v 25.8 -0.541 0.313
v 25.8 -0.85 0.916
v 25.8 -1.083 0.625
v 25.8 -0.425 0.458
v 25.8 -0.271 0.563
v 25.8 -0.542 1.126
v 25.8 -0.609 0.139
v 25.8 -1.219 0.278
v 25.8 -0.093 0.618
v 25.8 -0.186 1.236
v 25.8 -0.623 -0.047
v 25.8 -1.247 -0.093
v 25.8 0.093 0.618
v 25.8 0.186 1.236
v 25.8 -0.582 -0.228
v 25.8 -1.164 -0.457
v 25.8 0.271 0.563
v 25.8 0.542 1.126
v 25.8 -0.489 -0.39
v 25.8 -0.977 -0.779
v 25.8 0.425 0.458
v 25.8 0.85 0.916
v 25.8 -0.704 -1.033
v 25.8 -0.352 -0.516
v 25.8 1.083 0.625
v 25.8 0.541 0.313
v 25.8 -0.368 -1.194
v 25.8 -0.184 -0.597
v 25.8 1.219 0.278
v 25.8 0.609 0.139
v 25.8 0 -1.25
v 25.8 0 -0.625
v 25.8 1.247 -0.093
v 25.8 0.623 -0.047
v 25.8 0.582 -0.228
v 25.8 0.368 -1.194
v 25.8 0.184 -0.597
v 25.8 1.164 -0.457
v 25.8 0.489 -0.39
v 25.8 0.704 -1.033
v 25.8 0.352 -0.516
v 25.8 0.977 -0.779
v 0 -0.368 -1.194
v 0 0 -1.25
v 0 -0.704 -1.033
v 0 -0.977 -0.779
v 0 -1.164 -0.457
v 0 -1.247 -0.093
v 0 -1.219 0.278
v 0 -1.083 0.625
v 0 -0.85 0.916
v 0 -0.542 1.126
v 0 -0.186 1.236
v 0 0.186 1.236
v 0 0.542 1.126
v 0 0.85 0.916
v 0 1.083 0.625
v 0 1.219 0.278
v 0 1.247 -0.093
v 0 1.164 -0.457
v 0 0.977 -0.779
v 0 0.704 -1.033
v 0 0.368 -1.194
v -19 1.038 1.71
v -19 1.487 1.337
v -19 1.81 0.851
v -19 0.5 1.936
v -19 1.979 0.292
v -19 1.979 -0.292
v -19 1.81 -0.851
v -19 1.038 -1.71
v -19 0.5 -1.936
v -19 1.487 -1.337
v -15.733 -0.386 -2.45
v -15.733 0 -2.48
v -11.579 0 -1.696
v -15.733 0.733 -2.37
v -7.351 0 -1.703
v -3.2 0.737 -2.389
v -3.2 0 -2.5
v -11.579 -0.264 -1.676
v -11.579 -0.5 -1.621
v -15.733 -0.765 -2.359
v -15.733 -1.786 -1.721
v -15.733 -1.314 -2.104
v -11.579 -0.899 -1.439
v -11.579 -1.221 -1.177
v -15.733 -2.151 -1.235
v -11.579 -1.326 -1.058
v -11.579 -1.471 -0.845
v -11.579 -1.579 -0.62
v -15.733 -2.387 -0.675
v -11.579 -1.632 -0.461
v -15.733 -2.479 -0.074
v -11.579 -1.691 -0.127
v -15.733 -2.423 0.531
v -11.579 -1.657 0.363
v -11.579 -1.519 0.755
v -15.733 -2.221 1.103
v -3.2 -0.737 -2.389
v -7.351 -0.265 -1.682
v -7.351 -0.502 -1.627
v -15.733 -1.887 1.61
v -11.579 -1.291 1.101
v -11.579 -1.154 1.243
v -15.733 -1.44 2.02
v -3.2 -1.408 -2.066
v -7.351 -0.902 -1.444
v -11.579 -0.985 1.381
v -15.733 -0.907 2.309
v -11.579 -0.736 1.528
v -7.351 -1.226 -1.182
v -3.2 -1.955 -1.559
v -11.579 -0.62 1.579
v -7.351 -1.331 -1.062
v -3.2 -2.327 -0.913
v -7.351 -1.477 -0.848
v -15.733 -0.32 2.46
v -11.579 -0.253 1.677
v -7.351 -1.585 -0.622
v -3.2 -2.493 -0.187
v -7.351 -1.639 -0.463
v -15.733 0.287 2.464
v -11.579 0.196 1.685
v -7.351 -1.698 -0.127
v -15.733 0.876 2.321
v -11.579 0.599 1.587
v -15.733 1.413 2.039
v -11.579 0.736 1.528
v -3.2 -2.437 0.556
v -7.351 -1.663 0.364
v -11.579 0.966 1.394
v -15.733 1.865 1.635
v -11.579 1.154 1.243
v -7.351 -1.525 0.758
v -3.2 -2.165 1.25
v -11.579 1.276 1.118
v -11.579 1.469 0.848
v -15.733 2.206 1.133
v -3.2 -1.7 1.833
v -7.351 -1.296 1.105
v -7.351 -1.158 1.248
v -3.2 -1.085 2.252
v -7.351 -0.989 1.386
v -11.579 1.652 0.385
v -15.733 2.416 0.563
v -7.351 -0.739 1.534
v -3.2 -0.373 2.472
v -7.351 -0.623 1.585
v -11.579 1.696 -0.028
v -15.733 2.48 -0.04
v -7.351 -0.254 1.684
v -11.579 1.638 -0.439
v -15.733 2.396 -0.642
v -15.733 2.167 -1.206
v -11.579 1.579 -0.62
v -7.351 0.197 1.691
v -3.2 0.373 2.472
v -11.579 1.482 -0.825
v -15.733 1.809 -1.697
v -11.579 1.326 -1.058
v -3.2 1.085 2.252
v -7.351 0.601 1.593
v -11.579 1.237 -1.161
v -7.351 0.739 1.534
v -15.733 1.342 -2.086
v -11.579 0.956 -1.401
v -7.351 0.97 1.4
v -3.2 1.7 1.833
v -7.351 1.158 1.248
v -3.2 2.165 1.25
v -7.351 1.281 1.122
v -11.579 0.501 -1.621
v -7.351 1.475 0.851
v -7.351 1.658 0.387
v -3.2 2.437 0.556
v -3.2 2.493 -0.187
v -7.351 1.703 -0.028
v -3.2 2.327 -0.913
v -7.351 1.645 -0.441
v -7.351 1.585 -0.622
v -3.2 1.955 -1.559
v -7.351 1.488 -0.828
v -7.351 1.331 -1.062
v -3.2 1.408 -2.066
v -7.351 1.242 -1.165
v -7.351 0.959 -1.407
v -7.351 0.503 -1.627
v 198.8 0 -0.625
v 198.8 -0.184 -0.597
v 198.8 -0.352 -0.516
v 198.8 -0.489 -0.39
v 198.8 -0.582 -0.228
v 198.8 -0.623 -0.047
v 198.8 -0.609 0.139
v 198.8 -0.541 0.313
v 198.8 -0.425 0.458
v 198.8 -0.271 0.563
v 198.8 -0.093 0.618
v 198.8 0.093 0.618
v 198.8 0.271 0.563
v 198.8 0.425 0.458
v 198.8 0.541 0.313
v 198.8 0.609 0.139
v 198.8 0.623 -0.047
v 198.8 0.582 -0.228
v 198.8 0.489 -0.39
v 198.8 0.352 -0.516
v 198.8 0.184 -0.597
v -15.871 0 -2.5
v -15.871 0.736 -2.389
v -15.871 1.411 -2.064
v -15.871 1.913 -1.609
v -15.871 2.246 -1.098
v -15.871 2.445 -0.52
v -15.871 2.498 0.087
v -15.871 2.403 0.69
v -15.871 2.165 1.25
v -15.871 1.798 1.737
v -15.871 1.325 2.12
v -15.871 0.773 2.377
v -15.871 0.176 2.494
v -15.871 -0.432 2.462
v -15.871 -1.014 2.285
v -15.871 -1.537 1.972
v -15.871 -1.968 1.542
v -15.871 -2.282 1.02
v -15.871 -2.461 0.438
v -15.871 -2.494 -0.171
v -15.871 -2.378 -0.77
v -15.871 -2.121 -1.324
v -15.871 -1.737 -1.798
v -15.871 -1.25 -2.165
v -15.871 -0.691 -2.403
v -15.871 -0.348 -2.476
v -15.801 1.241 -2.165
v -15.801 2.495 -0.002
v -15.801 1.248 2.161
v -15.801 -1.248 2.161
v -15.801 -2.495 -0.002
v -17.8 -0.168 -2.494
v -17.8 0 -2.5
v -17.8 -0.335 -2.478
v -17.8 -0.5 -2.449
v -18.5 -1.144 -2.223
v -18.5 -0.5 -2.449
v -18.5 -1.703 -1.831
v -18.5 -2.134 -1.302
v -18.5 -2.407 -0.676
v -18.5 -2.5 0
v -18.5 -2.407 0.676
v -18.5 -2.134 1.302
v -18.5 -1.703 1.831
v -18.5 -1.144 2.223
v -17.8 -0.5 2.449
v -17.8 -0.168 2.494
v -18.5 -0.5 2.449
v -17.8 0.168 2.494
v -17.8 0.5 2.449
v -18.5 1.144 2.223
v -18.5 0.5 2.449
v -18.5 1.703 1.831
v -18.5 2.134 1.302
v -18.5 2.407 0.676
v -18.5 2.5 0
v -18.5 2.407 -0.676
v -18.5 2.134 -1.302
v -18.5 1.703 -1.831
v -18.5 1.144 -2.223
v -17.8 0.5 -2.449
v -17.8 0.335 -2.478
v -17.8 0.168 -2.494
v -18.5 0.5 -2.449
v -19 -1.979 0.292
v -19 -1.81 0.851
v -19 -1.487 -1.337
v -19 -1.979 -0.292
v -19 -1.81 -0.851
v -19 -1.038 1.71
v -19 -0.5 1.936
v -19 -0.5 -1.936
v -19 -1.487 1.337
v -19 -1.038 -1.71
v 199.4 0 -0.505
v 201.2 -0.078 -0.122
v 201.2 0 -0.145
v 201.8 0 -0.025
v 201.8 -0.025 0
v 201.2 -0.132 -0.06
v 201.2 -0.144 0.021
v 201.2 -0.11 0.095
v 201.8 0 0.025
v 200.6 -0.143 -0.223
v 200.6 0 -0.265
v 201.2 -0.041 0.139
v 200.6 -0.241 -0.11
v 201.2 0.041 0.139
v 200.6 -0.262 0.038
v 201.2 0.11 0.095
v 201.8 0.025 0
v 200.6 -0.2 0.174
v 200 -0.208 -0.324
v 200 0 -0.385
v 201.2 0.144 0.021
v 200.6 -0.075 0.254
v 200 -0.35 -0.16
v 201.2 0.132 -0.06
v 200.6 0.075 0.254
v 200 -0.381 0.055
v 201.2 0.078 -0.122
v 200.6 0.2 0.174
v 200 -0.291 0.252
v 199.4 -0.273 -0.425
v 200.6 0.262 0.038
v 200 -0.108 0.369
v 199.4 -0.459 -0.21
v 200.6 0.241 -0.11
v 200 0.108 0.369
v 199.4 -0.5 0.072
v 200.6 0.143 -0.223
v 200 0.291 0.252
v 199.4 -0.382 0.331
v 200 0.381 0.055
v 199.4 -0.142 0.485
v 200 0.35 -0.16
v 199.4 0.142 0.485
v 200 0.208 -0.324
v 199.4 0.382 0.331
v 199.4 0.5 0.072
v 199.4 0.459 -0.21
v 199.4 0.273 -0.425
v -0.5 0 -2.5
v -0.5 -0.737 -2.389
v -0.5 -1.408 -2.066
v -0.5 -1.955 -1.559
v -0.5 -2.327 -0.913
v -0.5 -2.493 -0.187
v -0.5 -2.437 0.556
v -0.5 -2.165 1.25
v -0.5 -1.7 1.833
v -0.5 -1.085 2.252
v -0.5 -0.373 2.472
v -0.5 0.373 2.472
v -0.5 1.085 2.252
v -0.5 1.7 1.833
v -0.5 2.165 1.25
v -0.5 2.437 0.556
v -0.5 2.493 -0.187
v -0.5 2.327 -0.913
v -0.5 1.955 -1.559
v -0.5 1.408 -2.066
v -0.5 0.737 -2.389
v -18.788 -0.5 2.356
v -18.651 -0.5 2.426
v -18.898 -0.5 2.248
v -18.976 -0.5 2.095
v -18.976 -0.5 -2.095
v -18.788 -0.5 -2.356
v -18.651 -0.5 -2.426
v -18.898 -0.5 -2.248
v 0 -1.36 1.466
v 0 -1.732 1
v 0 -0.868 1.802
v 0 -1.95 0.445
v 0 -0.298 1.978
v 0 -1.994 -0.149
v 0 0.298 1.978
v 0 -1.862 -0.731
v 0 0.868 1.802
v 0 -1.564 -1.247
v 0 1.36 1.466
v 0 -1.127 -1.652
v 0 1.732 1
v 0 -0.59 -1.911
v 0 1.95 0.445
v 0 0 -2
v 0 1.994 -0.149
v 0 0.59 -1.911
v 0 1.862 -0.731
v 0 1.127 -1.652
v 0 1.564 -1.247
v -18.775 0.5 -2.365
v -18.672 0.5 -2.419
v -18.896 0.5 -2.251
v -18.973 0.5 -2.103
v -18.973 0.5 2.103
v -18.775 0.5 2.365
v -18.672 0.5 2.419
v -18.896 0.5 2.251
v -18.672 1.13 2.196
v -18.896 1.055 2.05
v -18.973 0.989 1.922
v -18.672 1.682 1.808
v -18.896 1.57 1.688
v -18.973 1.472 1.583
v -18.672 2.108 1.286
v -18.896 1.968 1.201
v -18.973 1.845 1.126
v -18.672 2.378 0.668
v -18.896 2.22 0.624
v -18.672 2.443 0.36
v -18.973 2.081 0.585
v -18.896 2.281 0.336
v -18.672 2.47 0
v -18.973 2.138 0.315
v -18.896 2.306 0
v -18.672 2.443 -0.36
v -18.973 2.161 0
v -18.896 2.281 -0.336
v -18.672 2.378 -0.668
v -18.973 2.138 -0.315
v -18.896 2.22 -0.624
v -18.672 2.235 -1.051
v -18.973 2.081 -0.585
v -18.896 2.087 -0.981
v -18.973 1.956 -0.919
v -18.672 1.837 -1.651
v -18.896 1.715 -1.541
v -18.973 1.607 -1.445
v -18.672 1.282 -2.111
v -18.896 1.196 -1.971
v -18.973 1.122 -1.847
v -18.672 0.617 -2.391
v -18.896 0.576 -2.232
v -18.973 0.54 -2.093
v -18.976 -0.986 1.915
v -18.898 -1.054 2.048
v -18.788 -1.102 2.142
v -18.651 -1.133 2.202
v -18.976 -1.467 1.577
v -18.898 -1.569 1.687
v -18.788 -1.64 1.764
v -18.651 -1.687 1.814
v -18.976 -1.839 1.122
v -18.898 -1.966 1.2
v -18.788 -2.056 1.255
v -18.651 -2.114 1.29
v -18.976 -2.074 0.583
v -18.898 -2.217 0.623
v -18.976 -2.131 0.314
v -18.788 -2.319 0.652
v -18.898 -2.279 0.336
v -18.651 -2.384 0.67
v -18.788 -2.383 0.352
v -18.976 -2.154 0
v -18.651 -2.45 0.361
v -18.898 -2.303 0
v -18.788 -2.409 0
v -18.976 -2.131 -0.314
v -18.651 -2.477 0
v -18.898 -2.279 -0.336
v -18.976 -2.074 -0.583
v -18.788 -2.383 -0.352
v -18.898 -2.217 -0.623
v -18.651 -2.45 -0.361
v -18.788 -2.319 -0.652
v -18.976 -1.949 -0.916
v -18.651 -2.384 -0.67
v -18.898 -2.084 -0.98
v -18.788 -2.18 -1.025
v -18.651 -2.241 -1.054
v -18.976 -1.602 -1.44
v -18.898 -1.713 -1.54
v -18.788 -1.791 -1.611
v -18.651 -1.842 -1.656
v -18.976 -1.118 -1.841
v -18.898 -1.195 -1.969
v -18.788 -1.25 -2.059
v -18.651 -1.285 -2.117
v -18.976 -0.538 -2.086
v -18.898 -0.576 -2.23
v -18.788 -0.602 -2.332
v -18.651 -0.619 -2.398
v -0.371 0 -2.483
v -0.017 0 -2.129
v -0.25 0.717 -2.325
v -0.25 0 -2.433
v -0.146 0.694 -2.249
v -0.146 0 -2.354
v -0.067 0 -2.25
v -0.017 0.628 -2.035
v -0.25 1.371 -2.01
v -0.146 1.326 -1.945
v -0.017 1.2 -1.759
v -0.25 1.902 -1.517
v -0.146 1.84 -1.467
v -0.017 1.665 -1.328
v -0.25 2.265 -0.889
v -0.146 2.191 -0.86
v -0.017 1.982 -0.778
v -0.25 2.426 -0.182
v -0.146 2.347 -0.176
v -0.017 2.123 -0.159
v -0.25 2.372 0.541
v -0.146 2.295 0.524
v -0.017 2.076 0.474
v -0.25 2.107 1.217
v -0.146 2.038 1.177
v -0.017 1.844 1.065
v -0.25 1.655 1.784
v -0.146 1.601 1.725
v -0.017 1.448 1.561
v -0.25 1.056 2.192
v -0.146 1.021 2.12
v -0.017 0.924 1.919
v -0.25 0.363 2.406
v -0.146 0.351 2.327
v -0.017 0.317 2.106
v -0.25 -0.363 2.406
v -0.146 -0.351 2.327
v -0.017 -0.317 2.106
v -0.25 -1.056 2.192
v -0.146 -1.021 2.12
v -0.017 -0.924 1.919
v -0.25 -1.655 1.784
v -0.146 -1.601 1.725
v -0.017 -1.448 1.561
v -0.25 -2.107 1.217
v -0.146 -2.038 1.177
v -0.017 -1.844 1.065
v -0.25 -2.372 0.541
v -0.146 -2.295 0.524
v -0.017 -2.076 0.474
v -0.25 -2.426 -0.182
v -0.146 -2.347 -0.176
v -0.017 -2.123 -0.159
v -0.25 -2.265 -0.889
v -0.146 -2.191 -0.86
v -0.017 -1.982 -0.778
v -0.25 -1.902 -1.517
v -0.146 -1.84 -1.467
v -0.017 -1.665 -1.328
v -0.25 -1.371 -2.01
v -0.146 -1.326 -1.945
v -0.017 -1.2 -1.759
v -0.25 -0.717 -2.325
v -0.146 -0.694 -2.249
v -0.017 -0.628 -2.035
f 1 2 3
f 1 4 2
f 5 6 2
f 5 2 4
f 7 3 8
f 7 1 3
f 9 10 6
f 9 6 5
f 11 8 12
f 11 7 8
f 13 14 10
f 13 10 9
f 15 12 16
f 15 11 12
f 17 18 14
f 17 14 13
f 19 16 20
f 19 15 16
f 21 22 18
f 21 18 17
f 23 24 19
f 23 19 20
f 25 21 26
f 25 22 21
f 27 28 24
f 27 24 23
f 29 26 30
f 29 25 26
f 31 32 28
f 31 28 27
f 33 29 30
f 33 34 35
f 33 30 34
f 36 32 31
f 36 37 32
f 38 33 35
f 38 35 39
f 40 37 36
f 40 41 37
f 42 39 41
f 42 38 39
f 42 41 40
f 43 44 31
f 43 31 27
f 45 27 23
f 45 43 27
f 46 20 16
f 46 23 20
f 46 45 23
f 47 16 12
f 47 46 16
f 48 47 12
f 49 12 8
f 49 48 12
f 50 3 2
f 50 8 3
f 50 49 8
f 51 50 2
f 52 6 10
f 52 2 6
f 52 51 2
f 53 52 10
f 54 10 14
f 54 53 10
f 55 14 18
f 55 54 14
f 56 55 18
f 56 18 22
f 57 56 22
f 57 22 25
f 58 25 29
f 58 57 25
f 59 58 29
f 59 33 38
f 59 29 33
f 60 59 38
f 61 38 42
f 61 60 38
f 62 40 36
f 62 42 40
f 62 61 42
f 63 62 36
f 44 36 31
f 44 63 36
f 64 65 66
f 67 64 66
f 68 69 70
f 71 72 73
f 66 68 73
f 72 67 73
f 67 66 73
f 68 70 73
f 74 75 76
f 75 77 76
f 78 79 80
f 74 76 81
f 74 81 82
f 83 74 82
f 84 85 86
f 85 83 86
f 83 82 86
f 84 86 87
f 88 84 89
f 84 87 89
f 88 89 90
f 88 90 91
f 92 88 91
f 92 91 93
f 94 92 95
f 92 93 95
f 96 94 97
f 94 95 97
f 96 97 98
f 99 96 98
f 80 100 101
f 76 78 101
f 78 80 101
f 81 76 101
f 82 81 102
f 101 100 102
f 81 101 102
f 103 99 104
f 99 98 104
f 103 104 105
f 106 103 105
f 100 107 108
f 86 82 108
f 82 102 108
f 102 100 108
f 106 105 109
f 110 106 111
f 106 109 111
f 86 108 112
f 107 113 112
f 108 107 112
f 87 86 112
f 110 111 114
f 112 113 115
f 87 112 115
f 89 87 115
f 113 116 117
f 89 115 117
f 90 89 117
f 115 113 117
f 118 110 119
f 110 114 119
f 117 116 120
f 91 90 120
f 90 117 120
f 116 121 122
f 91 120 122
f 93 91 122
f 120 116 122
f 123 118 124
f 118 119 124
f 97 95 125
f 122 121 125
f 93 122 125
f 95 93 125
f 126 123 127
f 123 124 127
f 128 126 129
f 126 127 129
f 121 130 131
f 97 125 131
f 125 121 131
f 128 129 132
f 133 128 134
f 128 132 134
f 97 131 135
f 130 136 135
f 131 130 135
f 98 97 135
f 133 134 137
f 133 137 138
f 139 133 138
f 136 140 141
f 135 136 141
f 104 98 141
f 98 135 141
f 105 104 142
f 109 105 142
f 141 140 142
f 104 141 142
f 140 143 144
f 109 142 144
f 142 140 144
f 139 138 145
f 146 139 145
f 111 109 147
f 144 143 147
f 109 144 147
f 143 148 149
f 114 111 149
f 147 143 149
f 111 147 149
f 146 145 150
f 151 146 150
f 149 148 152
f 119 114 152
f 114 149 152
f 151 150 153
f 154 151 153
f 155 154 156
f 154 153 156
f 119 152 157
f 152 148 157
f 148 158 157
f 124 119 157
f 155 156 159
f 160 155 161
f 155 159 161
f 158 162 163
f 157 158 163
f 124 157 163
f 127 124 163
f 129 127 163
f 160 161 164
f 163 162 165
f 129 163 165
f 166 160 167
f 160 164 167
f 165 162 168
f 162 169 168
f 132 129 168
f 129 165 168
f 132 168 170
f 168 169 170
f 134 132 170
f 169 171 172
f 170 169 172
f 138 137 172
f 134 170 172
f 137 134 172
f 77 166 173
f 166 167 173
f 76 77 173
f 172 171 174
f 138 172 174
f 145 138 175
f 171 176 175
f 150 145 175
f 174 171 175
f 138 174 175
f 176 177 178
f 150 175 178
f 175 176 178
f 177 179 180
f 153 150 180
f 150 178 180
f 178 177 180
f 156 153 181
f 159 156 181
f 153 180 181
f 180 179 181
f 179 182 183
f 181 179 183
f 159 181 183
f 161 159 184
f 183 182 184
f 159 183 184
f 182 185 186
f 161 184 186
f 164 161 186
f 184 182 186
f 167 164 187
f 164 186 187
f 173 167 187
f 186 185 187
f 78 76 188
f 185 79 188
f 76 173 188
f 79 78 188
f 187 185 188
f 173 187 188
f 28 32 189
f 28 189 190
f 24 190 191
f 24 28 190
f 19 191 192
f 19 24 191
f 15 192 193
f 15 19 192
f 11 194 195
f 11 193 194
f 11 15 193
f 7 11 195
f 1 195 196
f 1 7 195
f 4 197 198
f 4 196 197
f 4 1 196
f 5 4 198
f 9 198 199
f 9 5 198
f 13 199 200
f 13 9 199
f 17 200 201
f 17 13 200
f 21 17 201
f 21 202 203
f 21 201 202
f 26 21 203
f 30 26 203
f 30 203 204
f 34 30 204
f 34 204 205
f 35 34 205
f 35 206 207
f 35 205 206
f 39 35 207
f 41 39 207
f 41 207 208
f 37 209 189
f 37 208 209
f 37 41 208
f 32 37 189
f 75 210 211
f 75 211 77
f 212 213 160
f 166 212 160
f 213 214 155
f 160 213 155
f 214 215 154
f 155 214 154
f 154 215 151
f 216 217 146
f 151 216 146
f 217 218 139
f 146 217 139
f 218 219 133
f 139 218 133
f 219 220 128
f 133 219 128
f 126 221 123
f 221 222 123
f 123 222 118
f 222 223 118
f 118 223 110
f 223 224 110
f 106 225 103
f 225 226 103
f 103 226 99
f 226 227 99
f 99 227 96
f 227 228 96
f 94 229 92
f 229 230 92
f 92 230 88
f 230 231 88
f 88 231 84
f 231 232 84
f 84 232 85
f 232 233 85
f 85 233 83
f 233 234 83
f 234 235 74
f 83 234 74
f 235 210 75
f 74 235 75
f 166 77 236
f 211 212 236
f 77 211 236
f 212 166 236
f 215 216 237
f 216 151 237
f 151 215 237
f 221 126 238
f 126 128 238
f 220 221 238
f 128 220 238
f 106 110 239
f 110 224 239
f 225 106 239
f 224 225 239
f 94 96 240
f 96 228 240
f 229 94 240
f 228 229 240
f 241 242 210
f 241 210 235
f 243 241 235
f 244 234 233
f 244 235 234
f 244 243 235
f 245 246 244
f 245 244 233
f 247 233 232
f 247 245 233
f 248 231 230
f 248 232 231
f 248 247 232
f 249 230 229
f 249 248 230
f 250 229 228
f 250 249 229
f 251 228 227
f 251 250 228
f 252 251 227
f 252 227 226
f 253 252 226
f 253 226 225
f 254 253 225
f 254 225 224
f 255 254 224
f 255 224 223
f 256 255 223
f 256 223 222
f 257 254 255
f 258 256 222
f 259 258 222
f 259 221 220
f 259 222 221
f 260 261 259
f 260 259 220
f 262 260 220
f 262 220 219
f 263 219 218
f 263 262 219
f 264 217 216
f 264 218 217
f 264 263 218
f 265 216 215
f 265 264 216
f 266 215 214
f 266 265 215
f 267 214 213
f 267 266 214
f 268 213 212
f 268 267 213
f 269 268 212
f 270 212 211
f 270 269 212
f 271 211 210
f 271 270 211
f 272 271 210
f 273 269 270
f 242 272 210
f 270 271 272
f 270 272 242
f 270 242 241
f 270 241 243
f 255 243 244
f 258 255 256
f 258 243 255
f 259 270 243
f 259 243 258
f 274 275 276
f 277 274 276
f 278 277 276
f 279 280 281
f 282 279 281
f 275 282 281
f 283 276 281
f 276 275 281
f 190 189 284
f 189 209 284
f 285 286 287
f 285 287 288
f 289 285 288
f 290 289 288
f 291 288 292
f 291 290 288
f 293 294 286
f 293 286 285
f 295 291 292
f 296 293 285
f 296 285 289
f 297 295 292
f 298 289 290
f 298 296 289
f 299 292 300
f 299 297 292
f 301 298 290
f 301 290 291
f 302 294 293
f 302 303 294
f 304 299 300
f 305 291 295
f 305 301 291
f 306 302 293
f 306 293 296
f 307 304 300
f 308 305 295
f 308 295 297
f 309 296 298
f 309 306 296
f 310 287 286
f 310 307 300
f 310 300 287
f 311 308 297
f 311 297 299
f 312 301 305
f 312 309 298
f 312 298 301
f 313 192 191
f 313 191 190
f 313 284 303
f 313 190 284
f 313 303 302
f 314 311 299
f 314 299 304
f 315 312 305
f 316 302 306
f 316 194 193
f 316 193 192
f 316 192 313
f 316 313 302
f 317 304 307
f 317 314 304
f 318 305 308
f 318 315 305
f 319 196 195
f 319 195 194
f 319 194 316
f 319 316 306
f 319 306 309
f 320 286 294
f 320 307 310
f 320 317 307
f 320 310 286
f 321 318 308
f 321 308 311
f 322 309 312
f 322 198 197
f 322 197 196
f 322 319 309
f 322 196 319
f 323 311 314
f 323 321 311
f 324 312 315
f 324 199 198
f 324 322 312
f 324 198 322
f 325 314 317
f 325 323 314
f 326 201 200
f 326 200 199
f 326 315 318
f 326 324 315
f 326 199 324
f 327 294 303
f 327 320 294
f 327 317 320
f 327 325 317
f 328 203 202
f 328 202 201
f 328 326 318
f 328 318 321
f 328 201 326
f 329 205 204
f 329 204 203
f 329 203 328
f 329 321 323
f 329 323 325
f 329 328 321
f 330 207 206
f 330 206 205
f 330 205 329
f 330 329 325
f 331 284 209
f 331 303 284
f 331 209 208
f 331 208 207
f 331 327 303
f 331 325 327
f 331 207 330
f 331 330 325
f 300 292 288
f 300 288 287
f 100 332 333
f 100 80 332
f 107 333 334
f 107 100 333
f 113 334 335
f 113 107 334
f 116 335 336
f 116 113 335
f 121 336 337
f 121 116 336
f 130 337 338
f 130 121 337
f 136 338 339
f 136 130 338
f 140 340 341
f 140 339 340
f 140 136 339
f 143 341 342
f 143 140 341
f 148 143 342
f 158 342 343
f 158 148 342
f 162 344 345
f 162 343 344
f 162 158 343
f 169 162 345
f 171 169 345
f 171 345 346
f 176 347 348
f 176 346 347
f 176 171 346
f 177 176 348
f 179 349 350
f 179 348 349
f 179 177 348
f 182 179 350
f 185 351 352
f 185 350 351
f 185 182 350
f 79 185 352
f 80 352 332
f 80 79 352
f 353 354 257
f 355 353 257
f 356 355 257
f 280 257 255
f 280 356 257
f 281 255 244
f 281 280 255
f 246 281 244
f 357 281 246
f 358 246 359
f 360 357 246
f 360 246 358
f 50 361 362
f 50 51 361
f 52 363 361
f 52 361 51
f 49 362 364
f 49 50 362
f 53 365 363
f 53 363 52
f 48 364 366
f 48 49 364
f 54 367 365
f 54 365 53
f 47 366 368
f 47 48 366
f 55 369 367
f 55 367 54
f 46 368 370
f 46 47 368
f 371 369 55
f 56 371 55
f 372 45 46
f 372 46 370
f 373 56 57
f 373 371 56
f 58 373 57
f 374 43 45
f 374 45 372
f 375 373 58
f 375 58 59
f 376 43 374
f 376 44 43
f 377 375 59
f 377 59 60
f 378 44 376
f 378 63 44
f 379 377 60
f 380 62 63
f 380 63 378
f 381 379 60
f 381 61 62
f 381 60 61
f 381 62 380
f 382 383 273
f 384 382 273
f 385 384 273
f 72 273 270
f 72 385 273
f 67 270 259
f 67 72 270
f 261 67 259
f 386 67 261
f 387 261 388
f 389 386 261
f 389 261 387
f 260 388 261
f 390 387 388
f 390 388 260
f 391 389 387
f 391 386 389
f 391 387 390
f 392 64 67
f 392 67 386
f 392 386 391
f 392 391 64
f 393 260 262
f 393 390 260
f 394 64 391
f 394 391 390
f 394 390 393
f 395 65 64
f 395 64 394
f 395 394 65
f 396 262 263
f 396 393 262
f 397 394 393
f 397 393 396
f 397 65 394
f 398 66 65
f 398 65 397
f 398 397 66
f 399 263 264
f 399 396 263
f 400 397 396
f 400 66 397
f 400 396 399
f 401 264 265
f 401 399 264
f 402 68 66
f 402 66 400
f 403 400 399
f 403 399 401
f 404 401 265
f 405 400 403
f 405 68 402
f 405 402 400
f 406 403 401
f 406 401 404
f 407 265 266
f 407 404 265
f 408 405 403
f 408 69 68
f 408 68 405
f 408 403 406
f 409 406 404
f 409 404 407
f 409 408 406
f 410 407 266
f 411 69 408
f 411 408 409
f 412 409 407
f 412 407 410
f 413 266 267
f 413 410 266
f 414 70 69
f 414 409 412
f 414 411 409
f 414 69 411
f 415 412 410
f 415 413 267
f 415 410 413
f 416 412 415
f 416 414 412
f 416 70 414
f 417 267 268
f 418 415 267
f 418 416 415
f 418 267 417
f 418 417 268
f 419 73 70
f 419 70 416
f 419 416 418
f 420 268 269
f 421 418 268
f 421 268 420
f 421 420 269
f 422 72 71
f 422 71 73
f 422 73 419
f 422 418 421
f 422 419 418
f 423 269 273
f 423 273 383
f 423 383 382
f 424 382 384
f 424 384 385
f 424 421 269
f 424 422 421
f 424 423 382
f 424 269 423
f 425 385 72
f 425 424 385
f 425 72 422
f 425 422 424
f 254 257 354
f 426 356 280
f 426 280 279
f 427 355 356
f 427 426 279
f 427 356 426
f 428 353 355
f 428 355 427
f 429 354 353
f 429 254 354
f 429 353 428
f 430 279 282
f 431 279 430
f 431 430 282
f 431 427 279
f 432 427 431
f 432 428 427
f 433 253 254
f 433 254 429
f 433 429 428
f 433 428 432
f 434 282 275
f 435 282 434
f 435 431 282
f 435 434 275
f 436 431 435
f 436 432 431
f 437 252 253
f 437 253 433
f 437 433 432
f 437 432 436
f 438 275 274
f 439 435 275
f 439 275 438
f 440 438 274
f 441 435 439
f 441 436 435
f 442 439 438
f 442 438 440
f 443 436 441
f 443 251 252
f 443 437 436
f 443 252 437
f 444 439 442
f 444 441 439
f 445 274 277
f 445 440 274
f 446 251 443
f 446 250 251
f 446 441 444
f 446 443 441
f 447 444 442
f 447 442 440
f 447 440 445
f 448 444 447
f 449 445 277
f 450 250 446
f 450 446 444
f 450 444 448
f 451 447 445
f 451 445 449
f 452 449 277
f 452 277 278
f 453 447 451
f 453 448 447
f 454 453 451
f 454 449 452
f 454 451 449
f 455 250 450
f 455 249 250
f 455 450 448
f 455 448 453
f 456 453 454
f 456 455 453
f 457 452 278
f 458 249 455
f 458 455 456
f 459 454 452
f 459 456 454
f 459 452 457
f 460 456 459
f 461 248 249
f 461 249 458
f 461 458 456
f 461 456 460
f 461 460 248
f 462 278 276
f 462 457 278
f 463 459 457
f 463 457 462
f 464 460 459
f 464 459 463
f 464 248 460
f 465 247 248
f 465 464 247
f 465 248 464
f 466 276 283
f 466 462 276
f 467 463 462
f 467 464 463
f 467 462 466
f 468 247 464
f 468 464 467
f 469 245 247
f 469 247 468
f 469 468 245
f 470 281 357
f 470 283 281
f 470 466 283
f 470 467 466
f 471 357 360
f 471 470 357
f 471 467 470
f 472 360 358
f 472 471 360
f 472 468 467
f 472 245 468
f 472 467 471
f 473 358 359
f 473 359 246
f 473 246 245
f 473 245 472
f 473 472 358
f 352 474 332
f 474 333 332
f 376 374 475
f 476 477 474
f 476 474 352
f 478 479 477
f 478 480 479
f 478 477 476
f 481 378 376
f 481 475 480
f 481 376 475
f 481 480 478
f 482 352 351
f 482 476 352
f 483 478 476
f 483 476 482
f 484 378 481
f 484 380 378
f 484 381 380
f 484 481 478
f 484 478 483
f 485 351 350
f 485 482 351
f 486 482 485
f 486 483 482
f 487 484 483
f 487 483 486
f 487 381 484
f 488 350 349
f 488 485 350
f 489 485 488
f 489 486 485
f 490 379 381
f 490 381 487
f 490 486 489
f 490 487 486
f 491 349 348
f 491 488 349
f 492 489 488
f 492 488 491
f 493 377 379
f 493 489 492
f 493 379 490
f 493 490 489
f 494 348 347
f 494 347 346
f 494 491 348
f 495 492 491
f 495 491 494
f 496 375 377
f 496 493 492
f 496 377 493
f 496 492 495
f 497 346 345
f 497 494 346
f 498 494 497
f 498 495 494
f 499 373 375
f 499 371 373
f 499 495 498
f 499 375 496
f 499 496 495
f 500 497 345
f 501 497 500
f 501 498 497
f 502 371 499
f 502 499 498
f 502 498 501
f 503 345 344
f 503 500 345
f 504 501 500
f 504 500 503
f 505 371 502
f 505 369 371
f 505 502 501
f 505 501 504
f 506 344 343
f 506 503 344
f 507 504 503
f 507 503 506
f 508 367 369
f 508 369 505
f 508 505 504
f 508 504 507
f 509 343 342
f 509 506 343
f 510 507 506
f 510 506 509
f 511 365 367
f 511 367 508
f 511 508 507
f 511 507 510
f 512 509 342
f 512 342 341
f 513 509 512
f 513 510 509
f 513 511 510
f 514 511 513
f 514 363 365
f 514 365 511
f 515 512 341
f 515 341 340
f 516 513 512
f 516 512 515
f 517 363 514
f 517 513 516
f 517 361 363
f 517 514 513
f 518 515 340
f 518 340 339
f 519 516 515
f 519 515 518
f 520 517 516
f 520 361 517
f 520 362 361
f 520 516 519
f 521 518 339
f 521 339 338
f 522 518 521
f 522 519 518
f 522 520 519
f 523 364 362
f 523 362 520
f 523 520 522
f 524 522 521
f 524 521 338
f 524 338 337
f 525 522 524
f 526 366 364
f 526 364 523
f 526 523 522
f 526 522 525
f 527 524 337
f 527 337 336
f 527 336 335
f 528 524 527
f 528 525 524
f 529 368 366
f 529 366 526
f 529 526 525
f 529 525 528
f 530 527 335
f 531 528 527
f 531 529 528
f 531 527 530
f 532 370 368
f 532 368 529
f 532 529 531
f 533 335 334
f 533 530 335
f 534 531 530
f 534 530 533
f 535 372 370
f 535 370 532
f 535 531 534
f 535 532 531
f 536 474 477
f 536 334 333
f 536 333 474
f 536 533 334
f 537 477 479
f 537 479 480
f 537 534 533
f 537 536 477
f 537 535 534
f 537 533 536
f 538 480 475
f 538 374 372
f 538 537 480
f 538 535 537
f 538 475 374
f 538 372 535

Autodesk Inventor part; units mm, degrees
ref_plane "YZ Plane" through (0, 0, 0) normal (1, 0, 0) x (0, 1, 0)
ref_plane "XZ Plane" through (0, 0, 0) normal (0, 1, 0) x (-1, 0, 0)
ref_plane "XY Plane" through (0, 0, 0) normal (0, 0, 1) x (1, 0, 0)
sketch "Skizze2" plane through (0, 0, 0) normal (0, 1, 0) x (-1, 0, 0)
  line L0 (0, 0) -> (0, -2.5)
  line L1 (0, -2.5) -> (3.2, -2.5)
  arc A0 (15.8, -2.5) -> (3.2, -2.5) centre (9.5, -24.1) ccw
  line L2 (15.8, -2.5) -> (19, -2.5)
  line L3 (19, -2.5) -> (19, 0)
  line L4 (19, 0) -> (0, 0)
  point P0 (9.5, -1.6)
  dimension "d5" = 2.5
  dimension "d6" = 2.5
  dimension "d7" = 3.2
  dimension "d8" = 3.2
  dimension "d9" = 19
  dimension "d10" = 0
  dimension "d11" = 1.6
revolve "Umdrehung2" add sketch "Skizze2" angle 360 about axis through (-19, 0, 0) along (1, 0, 0)
sketch "Skizze3" plane through (-19, 0, 0) normal (-1, 0, 0) x (0, 0, 1)
  line L0 (5, -0.5) -> (-6, -0.5)
  line L1 (-6, -0.5) -> (-6, 0.5)
  line L2 (-6, 0.5) -> (5, 0.5)
  line L3 (5, 0.5) -> (5, -0.5)
  point P0 (0, 0)
  dimension "d13" = 0.5
  dimension "d14" = 0.5
extrude "Extrusion1" cut sketch "Skizze3" against normal blind 1.2
fillet "Rundung1" radius 0.5 4 edges at (-15.8, 0, 2.5) (-19, 2.5, 0) (-19, -2.5, 0) (0, 0, 2.5)
sketch "Skizze4" plane through (0, 0, 0) normal (1, 0, 0) x (0, 0, -1)
  circle A0 centre (0, 0) radius 1.25
  dimension "d18" = 2.5
extrude "Extrusion2" add sketch "Skizze4" along normal blind 25.8
sketch "Skizze5" plane through (25.8, 0, 0) normal (1, 0, 0) x (0, 0, -1)
  circle A0 centre (0, 0) radius 2.4804 projected
  circle A1 centre (0, 0) radius 0.625
  dimension "d21" = 1.25
extrude "Extrusion3" add sketch "Skizze5" along normal blind 176 contours A1
chamfer "Fase1" distance 0.6 distance2 3 1 edges at (201.8, 0, 0.625) measured on face at (201.8, -0.1535, -0.4143)
equation "\"d6\" = d5"
equation "\"d14\" = d13"
properties part number "Nadel"
